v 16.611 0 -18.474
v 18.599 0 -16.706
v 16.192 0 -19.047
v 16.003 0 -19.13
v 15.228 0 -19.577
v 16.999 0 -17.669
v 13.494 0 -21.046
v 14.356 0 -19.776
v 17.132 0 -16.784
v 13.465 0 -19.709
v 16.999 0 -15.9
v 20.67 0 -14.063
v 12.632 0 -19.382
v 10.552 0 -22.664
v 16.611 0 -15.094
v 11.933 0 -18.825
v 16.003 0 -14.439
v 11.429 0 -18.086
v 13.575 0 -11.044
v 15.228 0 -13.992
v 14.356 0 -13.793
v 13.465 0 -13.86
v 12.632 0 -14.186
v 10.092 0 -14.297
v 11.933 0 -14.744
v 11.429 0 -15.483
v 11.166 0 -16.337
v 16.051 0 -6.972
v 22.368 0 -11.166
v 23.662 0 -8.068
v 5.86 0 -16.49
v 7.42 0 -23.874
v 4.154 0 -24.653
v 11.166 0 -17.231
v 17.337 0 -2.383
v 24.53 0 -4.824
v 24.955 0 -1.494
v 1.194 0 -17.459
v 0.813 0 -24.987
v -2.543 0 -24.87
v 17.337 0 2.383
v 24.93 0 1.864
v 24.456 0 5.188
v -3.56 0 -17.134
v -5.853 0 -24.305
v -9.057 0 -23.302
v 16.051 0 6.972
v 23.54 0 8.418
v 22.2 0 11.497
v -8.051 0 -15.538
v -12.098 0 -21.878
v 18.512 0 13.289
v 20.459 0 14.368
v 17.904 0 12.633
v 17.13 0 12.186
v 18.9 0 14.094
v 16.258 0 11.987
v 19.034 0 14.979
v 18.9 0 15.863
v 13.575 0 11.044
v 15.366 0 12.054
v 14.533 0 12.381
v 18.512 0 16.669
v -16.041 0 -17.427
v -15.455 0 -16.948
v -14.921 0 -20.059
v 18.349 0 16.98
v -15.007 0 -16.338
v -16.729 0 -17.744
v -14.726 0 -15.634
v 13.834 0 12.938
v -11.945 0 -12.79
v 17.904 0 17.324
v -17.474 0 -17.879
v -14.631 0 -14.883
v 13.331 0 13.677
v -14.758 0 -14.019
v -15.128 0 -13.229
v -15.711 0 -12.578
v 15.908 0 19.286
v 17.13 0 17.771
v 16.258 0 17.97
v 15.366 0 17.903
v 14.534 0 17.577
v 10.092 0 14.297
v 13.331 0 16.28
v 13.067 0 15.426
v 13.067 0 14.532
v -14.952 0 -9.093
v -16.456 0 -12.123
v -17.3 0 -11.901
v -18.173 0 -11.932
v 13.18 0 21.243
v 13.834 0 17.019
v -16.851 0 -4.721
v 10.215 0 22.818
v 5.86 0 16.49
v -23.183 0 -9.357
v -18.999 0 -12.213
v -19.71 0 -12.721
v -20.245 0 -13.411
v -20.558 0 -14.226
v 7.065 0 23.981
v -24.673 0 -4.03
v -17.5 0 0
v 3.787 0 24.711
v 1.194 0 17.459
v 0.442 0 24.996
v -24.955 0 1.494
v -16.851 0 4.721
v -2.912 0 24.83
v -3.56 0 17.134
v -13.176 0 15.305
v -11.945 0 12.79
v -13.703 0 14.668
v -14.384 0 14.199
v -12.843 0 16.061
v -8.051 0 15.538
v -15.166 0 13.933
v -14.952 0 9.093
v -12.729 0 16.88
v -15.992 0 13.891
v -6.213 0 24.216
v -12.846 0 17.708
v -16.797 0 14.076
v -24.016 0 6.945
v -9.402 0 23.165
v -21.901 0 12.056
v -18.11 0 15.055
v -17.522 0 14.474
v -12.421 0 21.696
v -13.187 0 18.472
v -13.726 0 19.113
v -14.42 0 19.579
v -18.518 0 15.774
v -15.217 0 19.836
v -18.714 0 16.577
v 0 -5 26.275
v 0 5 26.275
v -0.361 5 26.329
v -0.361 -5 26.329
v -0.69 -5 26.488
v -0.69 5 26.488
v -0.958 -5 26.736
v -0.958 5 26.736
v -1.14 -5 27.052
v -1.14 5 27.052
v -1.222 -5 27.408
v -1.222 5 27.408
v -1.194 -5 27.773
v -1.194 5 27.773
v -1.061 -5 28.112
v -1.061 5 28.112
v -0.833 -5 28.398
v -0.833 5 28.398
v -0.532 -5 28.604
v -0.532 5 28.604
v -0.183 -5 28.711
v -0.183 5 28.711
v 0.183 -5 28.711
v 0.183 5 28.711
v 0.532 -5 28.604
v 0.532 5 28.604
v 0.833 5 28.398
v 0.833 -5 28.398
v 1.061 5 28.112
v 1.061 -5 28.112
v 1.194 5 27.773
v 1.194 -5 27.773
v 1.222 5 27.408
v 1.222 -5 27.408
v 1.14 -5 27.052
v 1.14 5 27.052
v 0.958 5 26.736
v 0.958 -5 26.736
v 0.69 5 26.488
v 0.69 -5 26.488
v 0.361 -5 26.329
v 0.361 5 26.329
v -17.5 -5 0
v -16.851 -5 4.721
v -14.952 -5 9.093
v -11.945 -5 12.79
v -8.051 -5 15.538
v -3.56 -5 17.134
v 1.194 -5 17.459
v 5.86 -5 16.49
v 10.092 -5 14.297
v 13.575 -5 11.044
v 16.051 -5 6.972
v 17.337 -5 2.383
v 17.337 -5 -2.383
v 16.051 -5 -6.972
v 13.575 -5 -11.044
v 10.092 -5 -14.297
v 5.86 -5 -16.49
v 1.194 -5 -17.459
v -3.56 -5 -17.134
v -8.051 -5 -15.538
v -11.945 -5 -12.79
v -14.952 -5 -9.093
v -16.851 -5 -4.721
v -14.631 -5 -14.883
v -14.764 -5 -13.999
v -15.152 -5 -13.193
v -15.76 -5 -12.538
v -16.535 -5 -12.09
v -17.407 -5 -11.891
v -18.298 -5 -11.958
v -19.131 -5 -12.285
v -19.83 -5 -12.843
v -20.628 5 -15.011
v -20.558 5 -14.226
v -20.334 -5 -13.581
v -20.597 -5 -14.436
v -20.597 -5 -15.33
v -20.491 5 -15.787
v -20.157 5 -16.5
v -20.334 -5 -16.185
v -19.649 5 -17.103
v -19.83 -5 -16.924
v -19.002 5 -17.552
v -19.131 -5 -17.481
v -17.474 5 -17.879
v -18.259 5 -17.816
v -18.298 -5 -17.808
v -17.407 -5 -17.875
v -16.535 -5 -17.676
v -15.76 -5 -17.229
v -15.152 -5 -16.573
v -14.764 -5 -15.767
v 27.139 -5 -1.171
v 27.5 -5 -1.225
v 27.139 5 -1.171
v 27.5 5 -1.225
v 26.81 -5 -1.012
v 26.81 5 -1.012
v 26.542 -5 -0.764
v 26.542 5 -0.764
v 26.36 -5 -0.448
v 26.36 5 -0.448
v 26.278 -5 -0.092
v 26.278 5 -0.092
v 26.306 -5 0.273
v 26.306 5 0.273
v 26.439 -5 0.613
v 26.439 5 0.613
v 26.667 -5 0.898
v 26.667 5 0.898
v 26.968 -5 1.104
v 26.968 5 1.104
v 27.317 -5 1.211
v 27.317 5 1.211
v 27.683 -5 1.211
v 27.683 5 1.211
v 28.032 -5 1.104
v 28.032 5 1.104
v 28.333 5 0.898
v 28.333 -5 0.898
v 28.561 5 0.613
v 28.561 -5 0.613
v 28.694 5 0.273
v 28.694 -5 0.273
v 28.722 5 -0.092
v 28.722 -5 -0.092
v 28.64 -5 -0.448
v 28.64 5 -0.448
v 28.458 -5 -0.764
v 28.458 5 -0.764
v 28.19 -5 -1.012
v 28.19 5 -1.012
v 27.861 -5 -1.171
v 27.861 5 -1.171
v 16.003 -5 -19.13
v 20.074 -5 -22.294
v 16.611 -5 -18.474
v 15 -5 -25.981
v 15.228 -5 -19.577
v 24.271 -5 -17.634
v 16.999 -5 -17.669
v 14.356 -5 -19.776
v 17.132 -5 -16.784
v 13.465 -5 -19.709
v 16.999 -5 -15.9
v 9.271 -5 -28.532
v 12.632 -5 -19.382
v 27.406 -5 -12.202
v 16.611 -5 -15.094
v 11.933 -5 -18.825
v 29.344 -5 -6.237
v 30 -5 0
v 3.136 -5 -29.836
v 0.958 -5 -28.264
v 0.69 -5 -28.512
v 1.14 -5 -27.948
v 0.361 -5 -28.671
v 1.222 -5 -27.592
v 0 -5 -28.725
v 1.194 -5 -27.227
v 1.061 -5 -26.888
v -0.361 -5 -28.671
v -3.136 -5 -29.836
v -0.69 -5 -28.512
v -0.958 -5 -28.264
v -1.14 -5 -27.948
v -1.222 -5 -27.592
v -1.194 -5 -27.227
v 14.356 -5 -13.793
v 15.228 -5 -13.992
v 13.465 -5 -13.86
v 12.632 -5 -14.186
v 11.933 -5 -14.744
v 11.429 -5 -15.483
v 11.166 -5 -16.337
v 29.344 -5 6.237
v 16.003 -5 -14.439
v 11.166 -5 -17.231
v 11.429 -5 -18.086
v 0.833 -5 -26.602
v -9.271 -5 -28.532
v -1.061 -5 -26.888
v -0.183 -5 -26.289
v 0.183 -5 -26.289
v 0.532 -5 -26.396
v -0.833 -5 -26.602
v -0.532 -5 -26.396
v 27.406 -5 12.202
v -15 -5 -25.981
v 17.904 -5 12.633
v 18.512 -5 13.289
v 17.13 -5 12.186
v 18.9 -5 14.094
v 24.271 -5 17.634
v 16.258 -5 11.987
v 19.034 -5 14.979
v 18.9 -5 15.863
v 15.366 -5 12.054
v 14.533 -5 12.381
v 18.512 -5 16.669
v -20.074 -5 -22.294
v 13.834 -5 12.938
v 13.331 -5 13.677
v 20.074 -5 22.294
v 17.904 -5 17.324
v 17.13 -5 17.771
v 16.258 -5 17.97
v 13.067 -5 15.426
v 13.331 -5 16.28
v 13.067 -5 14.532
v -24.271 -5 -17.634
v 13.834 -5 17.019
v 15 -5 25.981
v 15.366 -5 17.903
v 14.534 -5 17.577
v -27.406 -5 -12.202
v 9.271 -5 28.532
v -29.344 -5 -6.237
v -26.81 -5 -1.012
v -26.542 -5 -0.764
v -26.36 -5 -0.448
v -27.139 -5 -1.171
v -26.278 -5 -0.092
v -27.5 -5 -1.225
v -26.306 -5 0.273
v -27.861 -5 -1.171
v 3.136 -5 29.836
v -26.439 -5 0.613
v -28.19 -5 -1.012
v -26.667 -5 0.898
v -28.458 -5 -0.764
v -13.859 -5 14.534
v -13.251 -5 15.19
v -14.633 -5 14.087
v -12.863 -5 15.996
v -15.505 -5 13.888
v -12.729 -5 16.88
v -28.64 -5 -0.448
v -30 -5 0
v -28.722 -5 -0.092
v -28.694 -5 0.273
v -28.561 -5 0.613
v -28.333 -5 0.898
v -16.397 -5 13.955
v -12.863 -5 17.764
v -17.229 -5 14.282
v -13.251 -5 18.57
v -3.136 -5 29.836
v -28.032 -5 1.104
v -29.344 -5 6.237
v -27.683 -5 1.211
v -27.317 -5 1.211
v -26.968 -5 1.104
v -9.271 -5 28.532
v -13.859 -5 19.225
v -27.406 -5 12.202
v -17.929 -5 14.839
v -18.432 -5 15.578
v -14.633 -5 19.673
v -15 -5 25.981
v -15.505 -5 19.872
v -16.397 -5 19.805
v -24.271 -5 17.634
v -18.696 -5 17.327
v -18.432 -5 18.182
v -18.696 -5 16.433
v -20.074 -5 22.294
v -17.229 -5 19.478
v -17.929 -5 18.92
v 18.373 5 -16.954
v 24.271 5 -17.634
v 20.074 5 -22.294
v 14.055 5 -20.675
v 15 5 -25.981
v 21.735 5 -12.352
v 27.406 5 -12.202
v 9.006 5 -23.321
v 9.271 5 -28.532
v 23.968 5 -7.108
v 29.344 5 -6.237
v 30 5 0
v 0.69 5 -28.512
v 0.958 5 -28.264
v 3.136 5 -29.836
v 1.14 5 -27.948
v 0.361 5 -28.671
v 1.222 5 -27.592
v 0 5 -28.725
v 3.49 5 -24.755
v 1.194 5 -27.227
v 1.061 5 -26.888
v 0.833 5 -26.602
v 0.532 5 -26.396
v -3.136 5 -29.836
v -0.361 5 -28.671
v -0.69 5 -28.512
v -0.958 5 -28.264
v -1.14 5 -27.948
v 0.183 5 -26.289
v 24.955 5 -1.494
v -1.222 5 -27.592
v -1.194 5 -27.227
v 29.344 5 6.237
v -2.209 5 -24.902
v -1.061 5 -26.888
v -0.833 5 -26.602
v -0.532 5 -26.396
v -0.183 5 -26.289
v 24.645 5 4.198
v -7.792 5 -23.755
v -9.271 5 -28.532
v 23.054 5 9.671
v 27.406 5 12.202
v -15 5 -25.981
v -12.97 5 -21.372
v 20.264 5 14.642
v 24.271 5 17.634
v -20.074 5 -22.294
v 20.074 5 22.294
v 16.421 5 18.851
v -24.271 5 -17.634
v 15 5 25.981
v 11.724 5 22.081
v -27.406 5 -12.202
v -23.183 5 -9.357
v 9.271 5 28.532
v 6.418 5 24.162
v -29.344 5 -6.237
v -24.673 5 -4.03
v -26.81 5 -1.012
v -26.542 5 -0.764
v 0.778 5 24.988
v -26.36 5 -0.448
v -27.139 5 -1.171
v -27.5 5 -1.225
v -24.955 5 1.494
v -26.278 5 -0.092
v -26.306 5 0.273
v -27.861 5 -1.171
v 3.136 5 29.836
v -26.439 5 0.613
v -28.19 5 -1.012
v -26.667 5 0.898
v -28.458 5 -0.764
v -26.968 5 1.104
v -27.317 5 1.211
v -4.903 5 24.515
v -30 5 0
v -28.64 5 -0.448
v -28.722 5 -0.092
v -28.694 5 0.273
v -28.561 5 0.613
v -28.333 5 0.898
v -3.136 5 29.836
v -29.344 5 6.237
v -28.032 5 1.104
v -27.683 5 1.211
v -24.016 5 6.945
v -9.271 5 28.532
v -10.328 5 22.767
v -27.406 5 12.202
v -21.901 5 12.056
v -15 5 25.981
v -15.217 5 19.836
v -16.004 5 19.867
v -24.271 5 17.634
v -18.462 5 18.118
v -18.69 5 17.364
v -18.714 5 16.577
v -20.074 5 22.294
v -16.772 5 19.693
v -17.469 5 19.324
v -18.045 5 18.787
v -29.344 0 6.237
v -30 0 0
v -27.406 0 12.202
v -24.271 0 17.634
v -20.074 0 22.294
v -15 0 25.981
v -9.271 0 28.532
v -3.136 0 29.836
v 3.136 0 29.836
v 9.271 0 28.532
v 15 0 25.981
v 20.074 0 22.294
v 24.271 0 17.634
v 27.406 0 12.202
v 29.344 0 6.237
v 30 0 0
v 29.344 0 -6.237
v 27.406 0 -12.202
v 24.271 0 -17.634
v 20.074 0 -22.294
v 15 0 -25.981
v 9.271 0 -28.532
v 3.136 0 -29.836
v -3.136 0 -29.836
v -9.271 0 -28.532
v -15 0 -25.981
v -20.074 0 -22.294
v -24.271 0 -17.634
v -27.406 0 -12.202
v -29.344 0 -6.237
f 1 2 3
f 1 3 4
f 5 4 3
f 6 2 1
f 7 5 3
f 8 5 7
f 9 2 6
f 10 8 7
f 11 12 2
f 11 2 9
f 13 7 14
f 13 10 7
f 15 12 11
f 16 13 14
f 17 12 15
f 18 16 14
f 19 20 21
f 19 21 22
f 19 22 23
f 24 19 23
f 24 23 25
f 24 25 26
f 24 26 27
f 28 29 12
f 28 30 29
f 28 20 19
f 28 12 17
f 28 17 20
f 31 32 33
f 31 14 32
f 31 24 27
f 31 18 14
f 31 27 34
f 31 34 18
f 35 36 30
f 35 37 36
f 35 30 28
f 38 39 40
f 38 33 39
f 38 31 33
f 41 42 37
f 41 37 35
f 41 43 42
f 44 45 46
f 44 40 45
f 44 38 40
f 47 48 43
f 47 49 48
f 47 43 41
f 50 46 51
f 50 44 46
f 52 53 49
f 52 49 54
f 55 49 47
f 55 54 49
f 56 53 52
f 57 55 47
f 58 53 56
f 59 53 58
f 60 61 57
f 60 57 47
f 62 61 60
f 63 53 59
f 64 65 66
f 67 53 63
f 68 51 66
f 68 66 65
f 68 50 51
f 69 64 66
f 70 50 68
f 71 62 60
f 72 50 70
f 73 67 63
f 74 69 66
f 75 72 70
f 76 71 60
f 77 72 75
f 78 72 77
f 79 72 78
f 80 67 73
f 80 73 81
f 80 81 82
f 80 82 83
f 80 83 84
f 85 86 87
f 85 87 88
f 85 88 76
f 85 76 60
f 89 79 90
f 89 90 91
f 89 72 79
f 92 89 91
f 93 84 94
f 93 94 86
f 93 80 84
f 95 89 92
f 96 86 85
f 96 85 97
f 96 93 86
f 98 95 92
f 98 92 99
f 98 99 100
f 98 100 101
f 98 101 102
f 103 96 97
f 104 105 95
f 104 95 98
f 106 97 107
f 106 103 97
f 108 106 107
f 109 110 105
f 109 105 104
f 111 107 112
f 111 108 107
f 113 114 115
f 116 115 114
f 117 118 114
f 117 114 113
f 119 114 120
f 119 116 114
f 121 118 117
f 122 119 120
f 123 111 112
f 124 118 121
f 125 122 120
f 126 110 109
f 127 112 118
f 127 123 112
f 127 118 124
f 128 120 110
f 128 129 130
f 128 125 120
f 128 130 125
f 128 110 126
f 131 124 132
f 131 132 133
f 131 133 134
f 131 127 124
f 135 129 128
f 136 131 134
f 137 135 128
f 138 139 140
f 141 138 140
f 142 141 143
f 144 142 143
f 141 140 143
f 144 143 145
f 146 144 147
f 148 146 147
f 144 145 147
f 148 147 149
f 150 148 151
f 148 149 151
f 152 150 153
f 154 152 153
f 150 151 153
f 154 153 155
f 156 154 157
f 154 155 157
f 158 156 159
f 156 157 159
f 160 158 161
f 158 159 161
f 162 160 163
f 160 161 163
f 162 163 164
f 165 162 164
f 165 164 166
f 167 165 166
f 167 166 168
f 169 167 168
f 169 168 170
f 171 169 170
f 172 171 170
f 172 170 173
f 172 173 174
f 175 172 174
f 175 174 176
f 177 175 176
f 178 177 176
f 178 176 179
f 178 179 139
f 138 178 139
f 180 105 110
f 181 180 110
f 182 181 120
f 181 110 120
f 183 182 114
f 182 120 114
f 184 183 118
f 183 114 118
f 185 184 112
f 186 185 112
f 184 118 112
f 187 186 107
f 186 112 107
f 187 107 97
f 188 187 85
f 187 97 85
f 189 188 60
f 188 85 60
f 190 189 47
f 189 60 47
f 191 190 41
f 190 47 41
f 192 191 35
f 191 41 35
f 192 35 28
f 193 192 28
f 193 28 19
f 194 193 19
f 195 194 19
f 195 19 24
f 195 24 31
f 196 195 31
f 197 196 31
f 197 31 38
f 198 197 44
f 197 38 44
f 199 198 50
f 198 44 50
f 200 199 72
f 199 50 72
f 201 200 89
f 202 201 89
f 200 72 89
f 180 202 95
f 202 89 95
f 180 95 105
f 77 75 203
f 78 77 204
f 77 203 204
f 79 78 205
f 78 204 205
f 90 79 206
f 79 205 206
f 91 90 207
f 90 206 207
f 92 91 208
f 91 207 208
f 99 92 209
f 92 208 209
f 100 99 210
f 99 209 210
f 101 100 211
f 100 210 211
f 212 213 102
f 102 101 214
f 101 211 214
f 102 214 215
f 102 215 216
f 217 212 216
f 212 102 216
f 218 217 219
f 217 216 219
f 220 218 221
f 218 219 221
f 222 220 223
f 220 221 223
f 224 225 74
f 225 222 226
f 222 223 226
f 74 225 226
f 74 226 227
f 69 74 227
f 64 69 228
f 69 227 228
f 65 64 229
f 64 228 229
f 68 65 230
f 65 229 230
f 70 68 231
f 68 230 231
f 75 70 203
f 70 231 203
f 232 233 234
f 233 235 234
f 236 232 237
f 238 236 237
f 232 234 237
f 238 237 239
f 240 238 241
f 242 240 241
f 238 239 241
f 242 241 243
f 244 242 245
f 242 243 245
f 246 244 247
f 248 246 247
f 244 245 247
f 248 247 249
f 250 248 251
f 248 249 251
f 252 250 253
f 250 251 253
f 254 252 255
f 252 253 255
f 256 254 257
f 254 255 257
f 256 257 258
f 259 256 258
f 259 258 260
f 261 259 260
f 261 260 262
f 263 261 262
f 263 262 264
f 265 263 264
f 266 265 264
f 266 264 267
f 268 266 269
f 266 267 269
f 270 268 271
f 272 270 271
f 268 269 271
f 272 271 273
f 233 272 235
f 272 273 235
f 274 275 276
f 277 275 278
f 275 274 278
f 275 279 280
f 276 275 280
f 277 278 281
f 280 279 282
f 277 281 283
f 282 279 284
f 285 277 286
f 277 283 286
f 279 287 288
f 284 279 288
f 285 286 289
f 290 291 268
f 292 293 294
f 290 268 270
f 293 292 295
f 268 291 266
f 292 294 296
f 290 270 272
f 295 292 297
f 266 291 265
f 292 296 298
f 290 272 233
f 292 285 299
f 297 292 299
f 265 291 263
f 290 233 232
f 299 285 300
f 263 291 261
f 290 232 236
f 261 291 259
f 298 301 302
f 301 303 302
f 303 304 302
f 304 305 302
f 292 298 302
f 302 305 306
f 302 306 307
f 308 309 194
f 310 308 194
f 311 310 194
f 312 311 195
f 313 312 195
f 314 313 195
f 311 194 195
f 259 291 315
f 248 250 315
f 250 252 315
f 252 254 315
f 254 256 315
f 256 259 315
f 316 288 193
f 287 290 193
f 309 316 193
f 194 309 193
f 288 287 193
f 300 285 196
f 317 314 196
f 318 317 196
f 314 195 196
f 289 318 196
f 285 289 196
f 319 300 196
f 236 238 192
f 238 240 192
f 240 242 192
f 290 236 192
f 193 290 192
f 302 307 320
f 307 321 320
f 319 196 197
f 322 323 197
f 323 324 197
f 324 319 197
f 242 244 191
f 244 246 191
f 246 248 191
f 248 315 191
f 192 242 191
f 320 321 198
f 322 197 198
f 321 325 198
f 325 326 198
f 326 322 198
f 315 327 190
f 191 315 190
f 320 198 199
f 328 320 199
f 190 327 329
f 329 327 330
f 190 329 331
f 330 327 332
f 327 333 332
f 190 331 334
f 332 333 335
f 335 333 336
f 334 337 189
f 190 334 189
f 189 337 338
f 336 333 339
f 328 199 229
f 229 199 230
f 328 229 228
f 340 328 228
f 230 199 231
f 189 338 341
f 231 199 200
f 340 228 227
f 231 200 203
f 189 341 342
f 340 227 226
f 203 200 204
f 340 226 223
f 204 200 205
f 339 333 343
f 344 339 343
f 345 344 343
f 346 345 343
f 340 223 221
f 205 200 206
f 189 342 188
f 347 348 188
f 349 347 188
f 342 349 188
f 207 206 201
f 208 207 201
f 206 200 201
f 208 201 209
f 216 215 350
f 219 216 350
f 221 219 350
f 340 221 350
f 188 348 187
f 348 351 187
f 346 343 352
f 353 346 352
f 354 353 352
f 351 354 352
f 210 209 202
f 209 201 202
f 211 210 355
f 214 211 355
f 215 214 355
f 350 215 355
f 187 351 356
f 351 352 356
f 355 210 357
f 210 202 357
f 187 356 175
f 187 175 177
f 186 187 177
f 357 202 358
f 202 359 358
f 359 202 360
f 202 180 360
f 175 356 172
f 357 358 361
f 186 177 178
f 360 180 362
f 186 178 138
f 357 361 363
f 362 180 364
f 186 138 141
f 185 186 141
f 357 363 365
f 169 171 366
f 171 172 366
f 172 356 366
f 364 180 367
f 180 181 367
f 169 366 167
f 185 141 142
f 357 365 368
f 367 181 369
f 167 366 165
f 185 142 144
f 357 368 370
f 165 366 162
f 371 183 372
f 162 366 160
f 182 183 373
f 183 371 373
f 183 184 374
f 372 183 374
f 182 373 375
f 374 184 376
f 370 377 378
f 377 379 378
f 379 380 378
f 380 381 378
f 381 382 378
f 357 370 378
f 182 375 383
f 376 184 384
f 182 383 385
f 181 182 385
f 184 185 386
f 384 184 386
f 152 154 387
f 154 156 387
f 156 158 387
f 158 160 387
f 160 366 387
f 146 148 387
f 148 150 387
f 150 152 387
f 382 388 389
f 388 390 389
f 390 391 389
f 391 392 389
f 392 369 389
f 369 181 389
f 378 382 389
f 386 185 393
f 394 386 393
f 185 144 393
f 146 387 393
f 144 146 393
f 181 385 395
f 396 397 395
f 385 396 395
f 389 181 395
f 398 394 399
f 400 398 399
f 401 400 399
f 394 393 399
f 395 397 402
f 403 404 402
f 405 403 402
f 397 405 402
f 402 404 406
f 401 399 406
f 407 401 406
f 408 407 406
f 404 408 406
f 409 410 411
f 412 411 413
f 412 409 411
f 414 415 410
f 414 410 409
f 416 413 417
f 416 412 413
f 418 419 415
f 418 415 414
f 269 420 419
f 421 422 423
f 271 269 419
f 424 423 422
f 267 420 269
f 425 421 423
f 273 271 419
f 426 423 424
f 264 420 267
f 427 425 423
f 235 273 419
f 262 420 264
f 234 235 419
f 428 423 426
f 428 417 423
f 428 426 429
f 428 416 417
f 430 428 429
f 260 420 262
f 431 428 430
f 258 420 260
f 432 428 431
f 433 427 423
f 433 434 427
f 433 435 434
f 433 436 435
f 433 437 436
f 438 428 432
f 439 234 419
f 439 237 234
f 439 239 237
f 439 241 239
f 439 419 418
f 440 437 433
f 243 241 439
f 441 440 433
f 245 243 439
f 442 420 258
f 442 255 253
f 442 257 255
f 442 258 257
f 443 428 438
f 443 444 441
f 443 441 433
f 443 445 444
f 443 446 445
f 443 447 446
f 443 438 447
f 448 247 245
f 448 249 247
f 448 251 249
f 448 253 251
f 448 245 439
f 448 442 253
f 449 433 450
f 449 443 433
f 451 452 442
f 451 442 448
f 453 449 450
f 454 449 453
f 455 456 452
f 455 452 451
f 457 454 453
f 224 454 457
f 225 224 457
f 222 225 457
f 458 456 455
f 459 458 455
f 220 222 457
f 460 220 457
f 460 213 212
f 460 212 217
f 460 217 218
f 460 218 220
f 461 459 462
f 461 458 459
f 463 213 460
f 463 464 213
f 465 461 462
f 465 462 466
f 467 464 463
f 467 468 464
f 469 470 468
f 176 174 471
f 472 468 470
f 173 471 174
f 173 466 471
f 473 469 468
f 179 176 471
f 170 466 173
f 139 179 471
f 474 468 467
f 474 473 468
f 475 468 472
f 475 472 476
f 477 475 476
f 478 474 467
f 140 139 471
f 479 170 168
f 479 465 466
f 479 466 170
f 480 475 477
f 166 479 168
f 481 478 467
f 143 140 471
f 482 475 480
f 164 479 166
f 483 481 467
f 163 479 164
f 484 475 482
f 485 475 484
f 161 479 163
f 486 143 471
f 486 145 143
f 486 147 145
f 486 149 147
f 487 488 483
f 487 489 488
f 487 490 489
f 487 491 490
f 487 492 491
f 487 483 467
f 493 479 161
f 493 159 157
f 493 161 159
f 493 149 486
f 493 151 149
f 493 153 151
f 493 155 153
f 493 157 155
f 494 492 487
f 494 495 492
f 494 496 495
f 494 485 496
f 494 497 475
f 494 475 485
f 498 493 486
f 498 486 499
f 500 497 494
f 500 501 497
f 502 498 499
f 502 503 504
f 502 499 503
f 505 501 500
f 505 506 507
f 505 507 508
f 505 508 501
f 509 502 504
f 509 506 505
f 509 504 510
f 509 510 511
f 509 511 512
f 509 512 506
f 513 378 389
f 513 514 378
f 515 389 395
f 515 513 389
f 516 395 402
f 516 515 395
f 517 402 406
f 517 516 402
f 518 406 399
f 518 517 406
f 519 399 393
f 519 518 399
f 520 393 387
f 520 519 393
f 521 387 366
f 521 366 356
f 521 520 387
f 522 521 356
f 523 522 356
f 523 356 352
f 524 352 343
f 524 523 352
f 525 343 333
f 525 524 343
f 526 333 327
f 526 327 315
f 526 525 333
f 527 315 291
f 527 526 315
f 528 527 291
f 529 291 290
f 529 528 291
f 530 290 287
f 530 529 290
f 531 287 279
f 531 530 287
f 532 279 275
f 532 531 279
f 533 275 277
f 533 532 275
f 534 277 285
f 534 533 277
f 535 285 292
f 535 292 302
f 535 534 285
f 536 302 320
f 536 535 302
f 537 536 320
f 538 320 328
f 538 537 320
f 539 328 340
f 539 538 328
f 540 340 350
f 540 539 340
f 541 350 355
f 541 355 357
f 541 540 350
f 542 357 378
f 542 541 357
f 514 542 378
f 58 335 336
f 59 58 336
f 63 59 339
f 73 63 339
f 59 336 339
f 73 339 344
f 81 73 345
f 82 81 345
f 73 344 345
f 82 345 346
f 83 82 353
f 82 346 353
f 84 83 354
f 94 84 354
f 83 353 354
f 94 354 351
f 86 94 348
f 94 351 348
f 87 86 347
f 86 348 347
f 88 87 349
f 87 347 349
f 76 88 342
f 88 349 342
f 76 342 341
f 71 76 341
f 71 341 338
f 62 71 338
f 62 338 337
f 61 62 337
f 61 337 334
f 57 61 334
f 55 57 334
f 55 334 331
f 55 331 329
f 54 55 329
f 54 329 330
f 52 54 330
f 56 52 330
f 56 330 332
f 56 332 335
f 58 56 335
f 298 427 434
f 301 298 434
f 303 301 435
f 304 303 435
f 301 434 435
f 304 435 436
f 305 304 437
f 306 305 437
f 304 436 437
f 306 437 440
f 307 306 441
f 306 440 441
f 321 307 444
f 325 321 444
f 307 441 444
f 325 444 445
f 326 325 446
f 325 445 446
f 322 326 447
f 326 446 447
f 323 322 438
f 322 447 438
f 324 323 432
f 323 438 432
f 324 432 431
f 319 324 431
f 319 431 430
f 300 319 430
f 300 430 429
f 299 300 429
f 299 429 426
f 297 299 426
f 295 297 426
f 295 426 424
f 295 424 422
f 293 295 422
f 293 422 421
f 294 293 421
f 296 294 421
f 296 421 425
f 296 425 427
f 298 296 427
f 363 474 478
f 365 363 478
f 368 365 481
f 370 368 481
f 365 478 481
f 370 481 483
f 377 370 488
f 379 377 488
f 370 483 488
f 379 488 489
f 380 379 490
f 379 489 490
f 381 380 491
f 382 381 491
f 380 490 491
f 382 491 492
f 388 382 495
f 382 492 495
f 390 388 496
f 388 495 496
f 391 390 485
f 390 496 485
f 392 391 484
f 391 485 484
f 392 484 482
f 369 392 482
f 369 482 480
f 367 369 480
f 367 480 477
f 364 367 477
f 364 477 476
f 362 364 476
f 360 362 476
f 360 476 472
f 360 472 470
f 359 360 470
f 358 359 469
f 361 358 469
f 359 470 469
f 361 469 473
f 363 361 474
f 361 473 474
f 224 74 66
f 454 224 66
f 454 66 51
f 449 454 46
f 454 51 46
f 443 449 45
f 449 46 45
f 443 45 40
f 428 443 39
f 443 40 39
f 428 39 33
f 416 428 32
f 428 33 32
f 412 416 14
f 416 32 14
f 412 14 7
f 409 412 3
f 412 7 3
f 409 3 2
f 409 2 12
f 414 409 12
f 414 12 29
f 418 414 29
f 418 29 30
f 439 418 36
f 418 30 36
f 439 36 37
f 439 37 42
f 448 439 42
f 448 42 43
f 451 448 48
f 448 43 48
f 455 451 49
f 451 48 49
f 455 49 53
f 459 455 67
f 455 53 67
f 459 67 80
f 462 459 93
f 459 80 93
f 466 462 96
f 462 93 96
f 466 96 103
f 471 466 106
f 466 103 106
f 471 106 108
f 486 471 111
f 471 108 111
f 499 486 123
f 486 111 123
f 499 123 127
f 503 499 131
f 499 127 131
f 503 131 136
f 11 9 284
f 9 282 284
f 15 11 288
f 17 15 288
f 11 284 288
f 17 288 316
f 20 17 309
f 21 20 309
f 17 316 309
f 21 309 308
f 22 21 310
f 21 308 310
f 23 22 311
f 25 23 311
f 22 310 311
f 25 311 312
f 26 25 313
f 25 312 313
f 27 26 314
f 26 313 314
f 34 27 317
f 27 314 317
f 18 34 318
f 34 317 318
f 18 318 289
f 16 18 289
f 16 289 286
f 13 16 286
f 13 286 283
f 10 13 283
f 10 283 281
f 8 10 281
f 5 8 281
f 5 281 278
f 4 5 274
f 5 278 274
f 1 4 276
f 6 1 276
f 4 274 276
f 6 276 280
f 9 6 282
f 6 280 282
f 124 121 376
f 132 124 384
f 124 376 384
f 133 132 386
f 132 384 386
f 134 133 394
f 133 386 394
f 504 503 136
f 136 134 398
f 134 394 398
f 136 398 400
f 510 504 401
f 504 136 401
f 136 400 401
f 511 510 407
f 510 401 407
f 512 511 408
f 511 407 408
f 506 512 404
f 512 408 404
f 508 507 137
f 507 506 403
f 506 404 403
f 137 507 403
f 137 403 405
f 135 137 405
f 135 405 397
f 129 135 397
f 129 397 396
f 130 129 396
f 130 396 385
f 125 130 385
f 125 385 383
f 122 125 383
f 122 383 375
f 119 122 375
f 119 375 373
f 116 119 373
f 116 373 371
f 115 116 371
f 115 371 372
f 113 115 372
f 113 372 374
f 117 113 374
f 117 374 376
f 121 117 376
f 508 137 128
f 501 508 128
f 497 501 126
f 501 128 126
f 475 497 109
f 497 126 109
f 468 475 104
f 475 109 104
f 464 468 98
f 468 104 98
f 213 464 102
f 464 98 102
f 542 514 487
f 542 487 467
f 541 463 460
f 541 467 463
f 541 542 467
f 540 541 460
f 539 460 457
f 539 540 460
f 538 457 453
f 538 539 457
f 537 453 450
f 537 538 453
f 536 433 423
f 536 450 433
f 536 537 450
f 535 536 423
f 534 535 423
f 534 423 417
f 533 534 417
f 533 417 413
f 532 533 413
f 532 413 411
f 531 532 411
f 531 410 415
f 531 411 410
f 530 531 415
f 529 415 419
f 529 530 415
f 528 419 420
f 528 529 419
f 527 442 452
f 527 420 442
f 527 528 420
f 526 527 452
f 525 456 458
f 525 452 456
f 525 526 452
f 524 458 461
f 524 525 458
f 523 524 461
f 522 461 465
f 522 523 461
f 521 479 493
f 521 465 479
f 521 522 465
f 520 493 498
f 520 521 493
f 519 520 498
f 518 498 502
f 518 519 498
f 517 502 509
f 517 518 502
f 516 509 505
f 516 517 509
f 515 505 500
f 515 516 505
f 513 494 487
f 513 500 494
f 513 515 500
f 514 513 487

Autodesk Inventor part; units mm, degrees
ref_plane "YZ Plane" through (0, 0, 0) normal (1, 0, 0) x (0, 1, 0)
ref_plane "XZ Plane" through (0, 0, 0) normal (0, 1, 0) x (-1, 0, 0)
ref_plane "XY Plane" through (0, 0, 0) normal (0, 0, 1) x (1, 0, 0)
sketch "Sketch1" plane through (0, 0, 0) normal (0, 1, 0) x (-1, 0, 0)
  circle A0 centre (0, 0) radius 25
  circle A1 centre (0, 0) radius 30
  circle A2 centre (0, 0) radius 17.5
  line L0 (0, 0) -> (25, 0) construction
  circle A3 centre (17.6777, -17.6777) radius 2
  circle A4 centre (17.6777, 17.6777) radius 2
  circle A5 centre (-17.6777, 17.6777) radius 2
  circle A6 centre (-17.6777, -17.6777) radius 2
  point P0 (0, -27.5)
  point P1 (0, -27.5)
  point P2 (27.5, 0)
  point P3 (-27.5, 0)
  point P4 (0, 27.5)
  dimension "d0" = 50
  dimension "d1" = 60
  dimension "d17" = 27.5
  dimension "d18" = 27.5
  dimension "d19" = 27.5
  dimension "d20" = 27.5
  dimension "d28" = 35
  dimension "d30" = 4
  dimension "d33" = 360
extrude "Extrusion1" add sketch "Sketch1" along normal blind 5 contours A0 A4 | A3 A0 | A0 A5 | A6 A0 | A1 picked at (18.1752, 18.1125) picked at (18.1752, -18.1125) picked at (-18.083, 18.1995) picked at (-18.083, -18.1995)
extrude "Extrusion2" add sketch "Sketch1" against normal blind 5 contours A0 A3 A6 A5 A4 | A4 A0 | A0 A4 | A3 A0 | A0 A3 | A5 A0 | A0 A5 | A6 A0 | A0 A6 | A1
hole "Hole2" at (0, 0, -27.5) at (-27.5, 0, 0) at (27.5, 0, 0) at (0, 0, 27.5) direction (0, 1, 0) diameter 2.45 end through all both
sketch "Sketch3" plane through (0, -5, 0) normal (0, -1, 0) x (1, 0, 0)
  circle A0 centre (16.0335, 14.9787) radius 3
  circle A1 centre (-15.7294, 16.8799) radius 3
  circle A2 centre (-17.6307, -14.8831) radius 3
  circle A3 centre (14.1323, -16.7843) radius 3
  point P0 (0, 0)
extrude "Extrusion4" cut sketch "Sketch3" against normal blind 10
properties part number "Placeholderjointouterring" material "Aluminum 6061-AHC"
